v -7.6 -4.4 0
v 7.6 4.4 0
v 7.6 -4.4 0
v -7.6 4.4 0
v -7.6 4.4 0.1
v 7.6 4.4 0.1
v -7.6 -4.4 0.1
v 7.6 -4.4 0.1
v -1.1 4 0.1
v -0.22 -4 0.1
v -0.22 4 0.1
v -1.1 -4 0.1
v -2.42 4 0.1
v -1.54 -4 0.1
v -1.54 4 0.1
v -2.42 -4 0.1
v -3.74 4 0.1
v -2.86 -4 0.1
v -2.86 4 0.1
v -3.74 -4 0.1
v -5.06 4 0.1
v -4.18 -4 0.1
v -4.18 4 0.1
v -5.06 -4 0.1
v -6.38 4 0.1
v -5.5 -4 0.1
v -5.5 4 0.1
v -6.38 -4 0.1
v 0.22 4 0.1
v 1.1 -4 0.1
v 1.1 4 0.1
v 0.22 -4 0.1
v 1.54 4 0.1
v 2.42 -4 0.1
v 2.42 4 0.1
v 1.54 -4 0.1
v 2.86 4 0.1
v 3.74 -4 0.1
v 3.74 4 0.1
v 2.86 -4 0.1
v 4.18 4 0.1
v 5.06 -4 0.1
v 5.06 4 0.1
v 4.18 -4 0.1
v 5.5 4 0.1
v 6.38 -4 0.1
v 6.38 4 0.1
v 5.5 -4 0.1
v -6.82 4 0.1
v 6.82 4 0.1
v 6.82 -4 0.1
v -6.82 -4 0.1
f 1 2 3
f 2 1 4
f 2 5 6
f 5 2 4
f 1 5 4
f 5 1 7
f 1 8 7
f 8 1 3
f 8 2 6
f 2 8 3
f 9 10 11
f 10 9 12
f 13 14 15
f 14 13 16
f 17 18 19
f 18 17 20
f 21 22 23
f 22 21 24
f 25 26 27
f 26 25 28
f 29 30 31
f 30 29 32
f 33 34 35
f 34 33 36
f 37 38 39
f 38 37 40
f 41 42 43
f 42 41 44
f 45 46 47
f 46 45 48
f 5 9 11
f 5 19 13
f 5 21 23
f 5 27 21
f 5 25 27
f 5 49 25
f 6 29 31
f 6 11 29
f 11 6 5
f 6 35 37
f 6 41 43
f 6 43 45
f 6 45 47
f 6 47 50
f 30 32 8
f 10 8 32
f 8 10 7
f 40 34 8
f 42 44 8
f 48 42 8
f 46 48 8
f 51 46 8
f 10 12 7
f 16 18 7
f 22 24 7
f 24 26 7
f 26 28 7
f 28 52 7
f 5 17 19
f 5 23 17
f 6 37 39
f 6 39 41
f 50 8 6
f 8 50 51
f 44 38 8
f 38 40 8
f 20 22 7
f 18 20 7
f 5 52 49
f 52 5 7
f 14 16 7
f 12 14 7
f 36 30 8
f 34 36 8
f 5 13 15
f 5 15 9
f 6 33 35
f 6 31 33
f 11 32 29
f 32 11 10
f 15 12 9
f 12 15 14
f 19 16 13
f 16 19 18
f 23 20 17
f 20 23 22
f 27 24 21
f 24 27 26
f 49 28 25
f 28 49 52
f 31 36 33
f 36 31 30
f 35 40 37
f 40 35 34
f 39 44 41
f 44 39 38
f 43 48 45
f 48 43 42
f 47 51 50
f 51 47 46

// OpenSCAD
// file: ../p/4-4edge.scad
use <../lib.scad>
$fa=1; $fs=0.2;
function ldraw_lib__4_4edge(realsolid=false) = [
// 0 Circle 1.0
// 0 Name: 4-4edge.dat
// 0 Author: James Jessiman
// 0 !LDRAW_ORG Primitive UPDATE 2017-01
// 0 !LICENSE Licensed under CC BY 2.0 and CC BY 4.0 : see CAreadme.txt
// 
// 0 BFC CERTIFY CCW
  [0,"BFC","CERTIFY"],
  [0,"BFC","CCW"],
// 
// 0 !HISTORY 1998-12-15 [PTadmin] Official Update 1998-10
// 0 !HISTORY 2005-12-28 [PTadmin] Official Update 2005-01
// 0 !HISTORY 2007-06-24 [PTadmin] Header formatted for Contributor Agreement
// 0 !HISTORY 2008-07-01 [PTadmin] Official Update 2008-01
// 0 !HISTORY 2017-01-15 [Steffen] BFCed
// 0 !HISTORY 2017-12-30 [PTadmin] Official Update 2017-01
// 
// 
// 2 24 1 0 0 0.9239 0 0.3827
  [2,24,1,0,0,0.9239,0,0.3827],
// 2 24 0.9239 0 0.3827 0.7071 0 0.7071
  [2,24,0.9239,0,0.3827,0.7071,0,0.7071],
// 2 24 0.7071 0 0.7071 0.3827 0 0.9239
  [2,24,0.7071,0,0.7071,0.3827,0,0.9239],
// 2 24 0.3827 0 0.9239 0 0 1
  [2,24,0.3827,0,0.9239,0,0,1],
// 2 24 0 0 1 -0.3827 0 0.9239
  [2,24,0,0,1,-0.3827,0,0.9239],
// 2 24 -0.3827 0 0.9239 -0.7071 0 0.7071
  [2,24,-0.3827,0,0.9239,-0.7071,0,0.7071],
// 2 24 -0.7071 0 0.7071 -0.9239 0 0.3827
  [2,24,-0.7071,0,0.7071,-0.9239,0,0.3827],
// 2 24 -0.9239 0 0.3827 -1 0 -0
  [2,24,-0.9239,0,0.3827,-1,0,-0],
// 2 24 -1 0 -0 -0.9239 0 -0.3827
  [2,24,-1,0,-0,-0.9239,0,-0.3827],
// 2 24 -0.9239 0 -0.3827 -0.7071 0 -0.7071
  [2,24,-0.9239,0,-0.3827,-0.7071,0,-0.7071],
// 2 24 -0.7071 0 -0.7071 -0.3827 0 -0.9239
  [2,24,-0.7071,0,-0.7071,-0.3827,0,-0.9239],
// 2 24 -0.3827 0 -0.9239 0 0 -1
  [2,24,-0.3827,0,-0.9239,0,0,-1],
// 2 24 0 0 -1 0.3827 0 -0.9239
  [2,24,0,0,-1,0.3827,0,-0.9239],
// 2 24 0.3827 0 -0.9239 0.7071 0 -0.7071
  [2,24,0.3827,0,-0.9239,0.7071,0,-0.7071],
// 2 24 0.7071 0 -0.7071 0.9239 0 -0.3827
  [2,24,0.7071,0,-0.7071,0.9239,0,-0.3827],
// 2 24 0.9239 0 -0.3827 1 0 0
  [2,24,0.9239,0,-0.3827,1,0,0],
];
module ldraw_lib__4_4edge(step=0, col=false, unit=2/5, alt=false, line=0.2, solid=!$preview)
    makepoly(ldraw_lib__4_4edge(solid), step=step, col=col, unit=unit, alt=alt, line=line, solid=solid);
ldraw_lib__4_4edge(line=0.2);
// file: ../p/4-4disc.scad
use <../lib.scad>
$fa=1; $fs=0.2;
function ldraw_lib__4_4disc(realsolid=false) = [
// 0 Disc 1.0
// 0 Name: 4-4disc.dat
// 0 Author: James Jessiman
// 0 !LDRAW_ORG Primitive UPDATE 2002-02
// 0 !LICENSE Licensed under CC BY 2.0 and CC BY 4.0 : see CAreadme.txt
// 
// 0 BFC CERTIFY CCW
  [0,"BFC","CERTIFY"],
  [0,"BFC","CCW"],
// 
// 0 !HISTORY 1998-12-15 [PTadmin] Official Update 1998-10
// 0 !HISTORY 2002-03-23 [sbliss] Added BFC statement
// 0 !HISTORY 2002-04-25 [PTadmin] Official Update 2002-02
// 0 !HISTORY 2007-06-24 [PTadmin] Header formatted for Contributor Agreement
// 0 !HISTORY 2008-07-01 [PTadmin] Official Update 2008-01
// 
// 
// 3 16 0 0 0 1 0 0 0.9239 0 0.3827
  [3,16,0,0,0,1,0,0,0.9239,0,0.3827],
// 3 16 0 0 0 0.9239 0 0.3827 0.7071 0 0.7071
  [3,16,0,0,0,0.9239,0,0.3827,0.7071,0,0.7071],
// 3 16 0 0 0 0.7071 0 0.7071 0.3827 0 0.9239
  [3,16,0,0,0,0.7071,0,0.7071,0.3827,0,0.9239],
// 3 16 0 0 0 0.3827 0 0.9239 0 0 1
  [3,16,0,0,0,0.3827,0,0.9239,0,0,1],
// 3 16 0 0 0 0 0 1 -0.3827 0 0.9239
  [3,16,0,0,0,0,0,1,-0.3827,0,0.9239],
// 3 16 0 0 0 -0.3827 0 0.9239 -0.7071 0 0.7071
  [3,16,0,0,0,-0.3827,0,0.9239,-0.7071,0,0.7071],
// 3 16 0 0 0 -0.7071 0 0.7071 -0.9239 0 0.3827
  [3,16,0,0,0,-0.7071,0,0.7071,-0.9239,0,0.3827],
// 3 16 0 0 0 -0.9239 0 0.3827 -1 0 -0
  [3,16,0,0,0,-0.9239,0,0.3827,-1,0,-0],
// 3 16 0 0 0 -1 0 -0 -0.9239 0 -0.3827
  [3,16,0,0,0,-1,0,-0,-0.9239,0,-0.3827],
// 3 16 0 0 0 -0.9239 0 -0.3827 -0.7071 0 -0.7071
  [3,16,0,0,0,-0.9239,0,-0.3827,-0.7071,0,-0.7071],
// 3 16 0 0 0 -0.7071 0 -0.7071 -0.3827 0 -0.9239
  [3,16,0,0,0,-0.7071,0,-0.7071,-0.3827,0,-0.9239],
// 3 16 0 0 0 -0.3827 0 -0.9239 0 0 -1
  [3,16,0,0,0,-0.3827,0,-0.9239,0,0,-1],
// 3 16 0 0 0 0 0 -1 0.3827 0 -0.9239
  [3,16,0,0,0,0,0,-1,0.3827,0,-0.9239],
// 3 16 0 0 0 0.3827 0 -0.9239 0.7071 0 -0.7071
  [3,16,0,0,0,0.3827,0,-0.9239,0.7071,0,-0.7071],
// 3 16 0 0 0 0.7071 0 -0.7071 0.9239 0 -0.3827
  [3,16,0,0,0,0.7071,0,-0.7071,0.9239,0,-0.3827],
// 3 16 0 0 0 0.9239 0 -0.3827 1 0 0
  [3,16,0,0,0,0.9239,0,-0.3827,1,0,0],
// 0
];
module ldraw_lib__4_4disc(step=0, col=false, unit=2/5, alt=false, line=0.2, solid=!$preview)
    makepoly(ldraw_lib__4_4disc(solid), step=step, col=col, unit=unit, alt=alt, line=line, solid=solid);
ldraw_lib__4_4disc(line=0.2);
// file: ../p/4-4cyli.scad
use <../lib.scad>
$fa=1; $fs=0.2;
function ldraw_lib__4_4cyli(realsolid=false) = [
// 0 Cylinder 1.0
// 0 Name: 4-4cyli.dat
// 0 Author: James Jessiman
// 0 !LDRAW_ORG Primitive UPDATE 2005-01
// 0 !LICENSE Licensed under CC BY 2.0 and CC BY 4.0 : see CAreadme.txt
// 
// 0 BFC CERTIFY CCW
  [0,"BFC","CERTIFY"],
  [0,"BFC","CCW"],
// 
// 0 !HISTORY 1998-12-15 [PTadmin] Official Update 1998-10
// 0 !HISTORY 2002-03-23 [sbliss] Added BFC statement; merged headers from files in distributions LDraw 0.27 and Complete.
// 0 !HISTORY 2002-04-25 [PTadmin] Official Update 2002-02
// 0 !HISTORY 2004-12-14 [guyvivan] BFC CCW
// 0 !HISTORY 2005-12-28 [PTadmin] Official Update 2005-01
// 0 !HISTORY 2007-06-24 [PTadmin] Header formatted for Contributor Agreement
// 0 !HISTORY 2008-07-01 [PTadmin] Official Update 2008-01
// 
// 
// 4 16 1 1 0 0.9239 1 0.3827 0.9239 0 0.3827 1 0 0
  [4,16,1,1,0,0.9239,1,0.3827,0.9239,0,0.3827,1,0,0],
// 5 24 1 0 0 1 1 0 0.9239 0 0.3827 0.9239 0 -0.3827
  [5,24,1,0,0,1,1,0,0.9239,0,0.3827,0.9239,0,-0.3827],
// 4 16 0.9239 1 0.3827 0.7071 1 0.7071 0.7071 0 0.7071 0.9239 0 0.3827
  [4,16,0.9239,1,0.3827,0.7071,1,0.7071,0.7071,0,0.7071,0.9239,0,0.3827],
// 5 24 0.9239 0 0.3827 0.9239 1 0.3827 0.7071 0 0.7071 1 0 0
  [5,24,0.9239,0,0.3827,0.9239,1,0.3827,0.7071,0,0.7071,1,0,0],
// 4 16 0.7071 1 0.7071 0.3827 1 0.9239 0.3827 0 0.9239 0.7071 0 0.7071
  [4,16,0.7071,1,0.7071,0.3827,1,0.9239,0.3827,0,0.9239,0.7071,0,0.7071],
// 5 24 0.7071 0 0.7071 0.7071 1 0.7071 0.3827 0 0.9239 0.9239 0 0.3827
  [5,24,0.7071,0,0.7071,0.7071,1,0.7071,0.3827,0,0.9239,0.9239,0,0.3827],
// 4 16 0.3827 1 0.9239 0 1 1 0 0 1 0.3827 0 0.9239
  [4,16,0.3827,1,0.9239,0,1,1,0,0,1,0.3827,0,0.9239],
// 5 24 0.3827 0 0.9239 0.3827 1 0.9239 0 0 1 0.7071 0 0.7071
  [5,24,0.3827,0,0.9239,0.3827,1,0.9239,0,0,1,0.7071,0,0.7071],
// 4 16 0 1 1 -0.3827 1 0.9239 -0.3827 0 0.9239 0 0 1
  [4,16,0,1,1,-0.3827,1,0.9239,-0.3827,0,0.9239,0,0,1],
// 5 24 0 0 1 0 1 1 -0.3827 0 0.9239 0.3827 0 0.9239
  [5,24,0,0,1,0,1,1,-0.3827,0,0.9239,0.3827,0,0.9239],
// 4 16 -0.3827 1 0.9239 -0.7071 1 0.7071 -0.7071 0 0.7071 -0.3827 0 0.9239
  [4,16,-0.3827,1,0.9239,-0.7071,1,0.7071,-0.7071,0,0.7071,-0.3827,0,0.9239],
// 5 24 -0.3827 0 0.9239 -0.3827 1 0.9239 -0.7071 0 0.7071 0 0 1
  [5,24,-0.3827,0,0.9239,-0.3827,1,0.9239,-0.7071,0,0.7071,0,0,1],
// 4 16 -0.7071 1 0.7071 -0.9239 1 0.3827 -0.9239 0 0.3827 -0.7071 0 0.7071
  [4,16,-0.7071,1,0.7071,-0.9239,1,0.3827,-0.9239,0,0.3827,-0.7071,0,0.7071],
// 5 24 -0.7071 0 0.7071 -0.7071 1 0.7071 -0.9239 0 0.3827 -0.3827 0 0.9239
  [5,24,-0.7071,0,0.7071,-0.7071,1,0.7071,-0.9239,0,0.3827,-0.3827,0,0.9239],
// 4 16 -0.9239 1 0.3827 -1 1 0 -1 0 0 -0.9239 0 0.3827
  [4,16,-0.9239,1,0.3827,-1,1,0,-1,0,0,-0.9239,0,0.3827],
// 5 24 -0.9239 0 0.3827 -0.9239 1 0.3827 -1 0 0 -0.7071 0 0.7071
  [5,24,-0.9239,0,0.3827,-0.9239,1,0.3827,-1,0,0,-0.7071,0,0.7071],
// 4 16 -1 1 0 -0.9239 1 -0.3827 -0.9239 0 -0.3827 -1 0 0
  [4,16,-1,1,0,-0.9239,1,-0.3827,-0.9239,0,-0.3827,-1,0,0],
// 5 24 -1 0 0 -1 1 0 -0.9239 0 -0.3827 -0.9239 0 0.3827
  [5,24,-1,0,0,-1,1,0,-0.9239,0,-0.3827,-0.9239,0,0.3827],
// 4 16 -0.9239 1 -0.3827 -0.7071 1 -0.7071 -0.7071 0 -0.7071 -0.9239 0 -0.3827
  [4,16,-0.9239,1,-0.3827,-0.7071,1,-0.7071,-0.7071,0,-0.7071,-0.9239,0,-0.3827],
// 5 24 -0.9239 0 -0.3827 -0.9239 1 -0.3827 -0.7071 0 -0.7071 -1 0 0
  [5,24,-0.9239,0,-0.3827,-0.9239,1,-0.3827,-0.7071,0,-0.7071,-1,0,0],
// 4 16 -0.7071 1 -0.7071 -0.3827 1 -0.9239 -0.3827 0 -0.9239 -0.7071 0 -0.7071
  [4,16,-0.7071,1,-0.7071,-0.3827,1,-0.9239,-0.3827,0,-0.9239,-0.7071,0,-0.7071],
// 5 24 -0.7071 0 -0.7071 -0.7071 1 -0.7071 -0.3827 0 -0.9239 -0.9239 0 -0.3827
  [5,24,-0.7071,0,-0.7071,-0.7071,1,-0.7071,-0.3827,0,-0.9239,-0.9239,0,-0.3827],
// 4 16 -0.3827 1 -0.9239 0 1 -1 0 0 -1 -0.3827 0 -0.9239
  [4,16,-0.3827,1,-0.9239,0,1,-1,0,0,-1,-0.3827,0,-0.9239],
// 5 24 -0.3827 0 -0.9239 -0.3827 1 -0.9239 0 0 -1 -0.7071 0 -0.7071
  [5,24,-0.3827,0,-0.9239,-0.3827,1,-0.9239,0,0,-1,-0.7071,0,-0.7071],
// 4 16 0 1 -1 0.3827 1 -0.9239 0.3827 0 -0.9239 0 0 -1
  [4,16,0,1,-1,0.3827,1,-0.9239,0.3827,0,-0.9239,0,0,-1],
// 5 24 0 0 -1 0 1 -1 0.3827 0 -0.9239 -0.3827 0 -0.9239
  [5,24,0,0,-1,0,1,-1,0.3827,0,-0.9239,-0.3827,0,-0.9239],
// 4 16 0.3827 1 -0.9239 0.7071 1 -0.7071 0.7071 0 -0.7071 0.3827 0 -0.9239
  [4,16,0.3827,1,-0.9239,0.7071,1,-0.7071,0.7071,0,-0.7071,0.3827,0,-0.9239],
// 5 24 0.3827 0 -0.9239 0.3827 1 -0.9239 0.7071 0 -0.7071 0 0 -1
  [5,24,0.3827,0,-0.9239,0.3827,1,-0.9239,0.7071,0,-0.7071,0,0,-1],
// 4 16 0.7071 1 -0.7071 0.9239 1 -0.3827 0.9239 0 -0.3827 0.7071 0 -0.7071
  [4,16,0.7071,1,-0.7071,0.9239,1,-0.3827,0.9239,0,-0.3827,0.7071,0,-0.7071],
// 5 24 0.7071 0 -0.7071 0.7071 1 -0.7071 0.9239 0 -0.3827 0.3827 0 -0.9239
  [5,24,0.7071,0,-0.7071,0.7071,1,-0.7071,0.9239,0,-0.3827,0.3827,0,-0.9239],
// 4 16 0.9239 1 -0.3827 1 1 0 1 0 0 0.9239 0 -0.3827
  [4,16,0.9239,1,-0.3827,1,1,0,1,0,0,0.9239,0,-0.3827],
// 5 24 0.9239 0 -0.3827 0.9239 1 -0.3827 1 0 0 0.7071 0 -0.7071
  [5,24,0.9239,0,-0.3827,0.9239,1,-0.3827,1,0,0,0.7071,0,-0.7071],
// 0
];
module ldraw_lib__4_4cyli(step=0, col=false, unit=2/5, alt=false, line=0.2, solid=!$preview)
    makepoly(ldraw_lib__4_4cyli(solid), step=step, col=col, unit=unit, alt=alt, line=line, solid=solid);
ldraw_lib__4_4cyli(line=0.2);
// file: ../p/stud3.scad
use <../lib.scad>
use <4-4cyli.scad>
use <4-4disc.scad>
use <4-4edge.scad>
$fa=1; $fs=0.2;
function ldraw_lib__stud3(realsolid=false) = realsolid ? 
    [openscad(translate([0,0,-eps()], o=cylinder(4+eps(), r=4)),2)] : [
// 0 Stud Tube Solid
// 0 Name: stud3.dat
// 0 Author: James Jessiman
// 0 !LDRAW_ORG Primitive UPDATE 2012-01
// 0 !LICENSE Licensed under CC BY 2.0 and CC BY 4.0 : see CAreadme.txt
// 
// 0 BFC CERTIFY CCW
  [0,"BFC","CERTIFY"],
  [0,"BFC","CCW"],
// 
// 0 !HISTORY 2002-04-04 [sbliss] Modified for BFC compliance
// 0 !HISTORY 2002-04-25 [PTadmin] Official Update 2002-02
// 0 !HISTORY 2007-06-24 [PTadmin] Header formatted for Contributor Agreement
// 0 !HISTORY 2008-07-01 [PTadmin] Official Update 2008-01
// 0 !HISTORY 2012-02-16 [Philo] Changed to CCW
// 0 !HISTORY 2012-03-30 [PTadmin] Official Update 2012-01
// 
// 
// 1 16 0 -4 0 4 0 0 0 1 0 0 0 4 4-4edge.dat
  [1,16,0,-4,0,4,0,0,0,1,0,0,0,4, ldraw_lib__4_4edge(realsolid)],
// 1 16 0 0 0 4 0 0 0 1 0 0 0 4 4-4edge.dat
  [1,16,0,0,0,4,0,0,0,1,0,0,0,4, ldraw_lib__4_4edge(realsolid)],
// 1 16 0 -4 0 4 0 0 0 1 0 0 0 4 4-4disc.dat
  [1,16,0,-4,0,4,0,0,0,1,0,0,0,4, ldraw_lib__4_4disc(realsolid)],
// 1 16 0 -4 0 4 0 0 0 4 0 0 0 4 4-4cyli.dat
  [1,16,0,-4,0,4,0,0,0,4,0,0,0,4, ldraw_lib__4_4cyli(realsolid)],
];
module ldraw_lib__stud3(step=0, col=false, unit=2/5, alt=false, line=0.2, solid=!$preview)
    makepoly(ldraw_lib__stud3(solid), step=step, col=col, unit=unit, alt=alt, line=line, solid=solid);
ldraw_lib__stud3(line=0.2);
// file: ../p/stud.scad
use <../lib.scad>
use <4-4cyli.scad>
use <4-4disc.scad>
use <4-4edge.scad>
$fa=1; $fs=0.2;
function ldraw_lib__stud(realsolid=false) = realsolid ? 
    [openscad(translate([0,0,-eps()], o=cylinder(4+eps(), r=6)),2)] : [
// 0 Stud
// 0 Name: stud.dat
// 0 Author: James Jessiman
// 0 !LDRAW_ORG Primitive UPDATE 2012-01
// 0 !LICENSE Licensed under CC BY 2.0 and CC BY 4.0 : see CAreadme.txt
// 
// 0 BFC CERTIFY CCW
  [0,"BFC","CERTIFY"],
  [0,"BFC","CCW"],
// 
// 0 !HISTORY 2002-04-04 [sbliss] Modified for BFC compliance
// 0 !HISTORY 2002-04-25 [PTadmin] Official Update 2002-02
// 0 !HISTORY 2007-06-24 [PTadmin] Header formatted for Contributor Agreement
// 0 !HISTORY 2008-07-01 [PTadmin] Official Update 2008-01
// 0 !HISTORY 2012-02-16 [Philo] Changed to CCW
// 0 !HISTORY 2012-03-30 [PTadmin] Official Update 2012-01
// 
// 
// 1 16 0 0 0 6 0 0 0 1 0 0 0 6 4-4edge.dat
  [1,16,0,0,0,6,0,0,0,1,0,0,0,6, ldraw_lib__4_4edge(realsolid)],
// 1 16 0 -4 0 6 0 0 0 1 0 0 0 6 4-4edge.dat
  [1,16,0,-4,0,6,0,0,0,1,0,0,0,6, ldraw_lib__4_4edge(realsolid)],
// 1 16 0 0 0 6 0 0 0 -4 0 0 0 6 4-4cyli.dat
  [1,16,0,0,0,6,0,0,0,-4,0,0,0,6, ldraw_lib__4_4cyli(realsolid)],
// 1 16 0 -4 0 6 0 0 0 1 0 0 0 6 4-4disc.dat
  [1,16,0,-4,0,6,0,0,0,1,0,0,0,6, ldraw_lib__4_4disc(realsolid)],
];
module ldraw_lib__stud(step=0, col=false, unit=2/5, alt=false, line=0.2, solid=!$preview)
    makepoly(ldraw_lib__stud(solid), step=step, col=col, unit=unit, alt=alt, line=line, solid=solid);
ldraw_lib__stud(line=0.2);
// file: ../p/box5.scad
use <../lib.scad>
$fa=1; $fs=0.2;
function ldraw_lib__box5(realsolid=false) = [
// 0 Box with 5 Faces and All Edges
// 0 Name: box5.dat
// 0 Author: James Jessiman
// 0 !LDRAW_ORG Primitive UPDATE 2012-01
// 0 !LICENSE Licensed under CC BY 2.0 and CC BY 4.0 : see CAreadme.txt
// 
// 0 BFC CERTIFY CCW
  [0,"BFC","CERTIFY"],
  [0,"BFC","CCW"],
// 
// 0 !HISTORY 2002-04-03 [sbliss] Modified for BFC compliance
// 0 !HISTORY 2002-04-25 [PTadmin] Official Update 2002-02
// 0 !HISTORY 2007-06-24 [PTadmin] Header formatted for Contributor Agreement
// 0 !HISTORY 2008-07-01 [PTadmin] Official Update 2008-01
// 0 !HISTORY 2012-02-16 [Philo] Changed to CCW
// 0 !HISTORY 2012-03-30 [PTadmin] Official Update 2012-01
// 
// 
// 2 24 1 1 1 -1 1 1
  [2,24,1,1,1,-1,1,1],
// 2 24 -1 1 1 -1 1 -1
  [2,24,-1,1,1,-1,1,-1],
// 2 24 -1 1 -1 1 1 -1
  [2,24,-1,1,-1,1,1,-1],
// 2 24 1 1 -1 1 1 1
  [2,24,1,1,-1,1,1,1],
// 2 24 1 0 1 -1 0 1
  [2,24,1,0,1,-1,0,1],
// 2 24 -1 0 1 -1 0 -1
  [2,24,-1,0,1,-1,0,-1],
// 2 24 -1 0 -1 1 0 -1
  [2,24,-1,0,-1,1,0,-1],
// 2 24 1 0 -1 1 0 1
  [2,24,1,0,-1,1,0,1],
// 2 24 1 0 1 1 1 1
  [2,24,1,0,1,1,1,1],
// 2 24 -1 0 1 -1 1 1
  [2,24,-1,0,1,-1,1,1],
// 2 24 1 0 -1 1 1 -1
  [2,24,1,0,-1,1,1,-1],
// 2 24 -1 0 -1 -1 1 -1
  [2,24,-1,0,-1,-1,1,-1],
// 4 16 -1 1 1 1 1 1 1 1 -1 -1 1 -1
  [4,16,-1,1,1,1,1,1,1,1,-1,-1,1,-1],
// 4 16 -1 1 1 -1 0 1 1 0 1 1 1 1
  [4,16,-1,1,1,-1,0,1,1,0,1,1,1,1],
// 4 16 -1 1 -1 -1 0 -1 -1 0 1 -1 1 1
  [4,16,-1,1,-1,-1,0,-1,-1,0,1,-1,1,1],
// 4 16 1 1 -1 1 0 -1 -1 0 -1 -1 1 -1
  [4,16,1,1,-1,1,0,-1,-1,0,-1,-1,1,-1],
// 4 16 1 1 1 1 0 1 1 0 -1 1 1 -1
  [4,16,1,1,1,1,0,1,1,0,-1,1,1,-1],
];
module ldraw_lib__box5(step=0, col=false, unit=2/5, alt=false, line=0.2, solid=!$preview)
    makepoly(ldraw_lib__box5(solid), step=step, col=col, unit=unit, alt=alt, line=line, solid=solid);
ldraw_lib__box5(line=0.2);
// file: ../p/box4t.scad
use <../lib.scad>
$fa=1; $fs=0.2;
function ldraw_lib__box4t(realsolid=false) = [
// 0 Box with 4 Adjacent Faces and All Edges
// 0 Name: box4t.dat
// 0 Author: Tore Eriksson [Tore_Eriksson]
// 0 !LDRAW_ORG Primitive UPDATE 2003-02
// 0 !LICENSE Licensed under CC BY 2.0 and CC BY 4.0 : see CAreadme.txt
// 
// 0 BFC CERTIFY CCW
  [0,"BFC","CERTIFY"],
  [0,"BFC","CCW"],
// 
// 0 !HISTORY 1997-09-29 [PTadmin] Official Update 1997-15
// 0 !HISTORY 2002-08-31 [izanette] Modified with WINDZ for BFC compliance
// 0 !HISTORY 2003-08-01 [PTadmin] Official Update 2003-02
// 0 !HISTORY 2007-06-24 [PTadmin] Header formatted for Contributor Agreement
// 0 !HISTORY 2008-07-01 [PTadmin] Official Update 2008-01
// 
// 
// 2 24 1 1 1 -1 1 1
  [2,24,1,1,1,-1,1,1],
// 2 24 -1 1 1 -1 1 -1
  [2,24,-1,1,1,-1,1,-1],
// 2 24 -1 1 -1 1 1 -1
  [2,24,-1,1,-1,1,1,-1],
// 2 24 1 1 -1 1 1 1
  [2,24,1,1,-1,1,1,1],
// 2 24 1 0 1 -1 0 1
  [2,24,1,0,1,-1,0,1],
// 2 24 -1 0 1 -1 0 -1
  [2,24,-1,0,1,-1,0,-1],
// 2 24 -1 0 -1 1 0 -1
  [2,24,-1,0,-1,1,0,-1],
// 2 24 1 0 -1 1 0 1
  [2,24,1,0,-1,1,0,1],
// 2 24 1 0 1 1 1 1
  [2,24,1,0,1,1,1,1],
// 2 24 -1 0 1 -1 1 1
  [2,24,-1,0,1,-1,1,1],
// 2 24 1 0 -1 1 1 -1
  [2,24,1,0,-1,1,1,-1],
// 2 24 -1 0 -1 -1 1 -1
  [2,24,-1,0,-1,-1,1,-1],
// 4 16 1 1 1 1 1 -1 -1 1 -1 -1 1 1
  [4,16,1,1,1,1,1,-1,-1,1,-1,-1,1,1],
// 4 16 1 1 1 -1 1 1 -1 0 1 1 0 1
  [4,16,1,1,1,-1,1,1,-1,0,1,1,0,1],
// 4 16 -1 1 1 -1 1 -1 -1 0 -1 -1 0 1
  [4,16,-1,1,1,-1,1,-1,-1,0,-1,-1,0,1],
// 0 4 16 -1 1 -1 -1 0 -1 1 0 -1 1 1 -1
// 4 16 1 1 -1 1 1 1 1 0 1 1 0 -1
  [4,16,1,1,-1,1,1,1,1,0,1,1,0,-1],
// 0
];
module ldraw_lib__box4t(step=0, col=false, unit=2/5, alt=false, line=0.2, solid=!$preview)
    makepoly(ldraw_lib__box4t(solid), step=step, col=col, unit=unit, alt=alt, line=line, solid=solid);
ldraw_lib__box4t(line=0.2);
// file: s/3004s01.scad
use <../../lib.scad>
use <../../p/box4t.scad>
use <../../p/box5.scad>
use <../../p/stud.scad>
use <../../p/stud3.scad>
$fa=1; $fs=0.2;
function ldraw_lib__s__3004s01(realsolid=false) = [
// 0 ~Brick  1 x  2 without Front Face
// 0 Name: s\3004s01.dat
// 0 Author: James Jessiman
// 0 !LDRAW_ORG Subpart UPDATE 2003-03
// 0 !LICENSE Licensed under CC BY 2.0 and CC BY 4.0 : see CAreadme.txt
// 
// 0 BFC CERTIFY CCW
  [0,"BFC","CERTIFY"],
  [0,"BFC","CCW"],
// 
// 0 !HISTORY 2003-09-07 [jriley] Subfiling, BFC
// 0 !HISTORY 2003-12-19 [PTadmin] Official Update 2003-03
// 0 !HISTORY 2007-08-29 [PTadmin] Header formatted for Contributor Agreement
// 0 !HISTORY 2008-07-01 [PTadmin] Official Update 2008-01
// 
// 
// 1 16 0 4 0 1 0 0 0 -5 0 0 0 1 stud3.dat
  [1,16,0,4,0,1,0,0,0,-5,0,0,0,1, ldraw_lib__stud3(realsolid)],
// 0 BFC INVERTNEXT
  [0,"BFC","INVERTNEXT"],
// 1 16 0 24 0 16 0 0 0 -20 0 0 0 6 box5.dat
  [1,16,0,24,0,16,0,0,0,-20,0,0,0,6, ldraw_lib__box5(realsolid)],
// 4 16 20 24 10 16 24 6 -16 24 6 -20 24 10
  [4,16,20,24,10,16,24,6,-16,24,6,-20,24,10],
// 4 16 -20 24 10 -16 24 6 -16 24 -6 -20 24 -10
  [4,16,-20,24,10,-16,24,6,-16,24,-6,-20,24,-10],
// 4 16 -20 24 -10 -16 24 -6 16 24 -6 20 24 -10
  [4,16,-20,24,-10,-16,24,-6,16,24,-6,20,24,-10],
// 4 16 20 24 -10 16 24 -6 16 24 6 20 24 10
  [4,16,20,24,-10,16,24,-6,16,24,6,20,24,10],
// 1 16 0 24 0 20 0 0 0 -24 0 0 0 10 box4t.dat
  [1,16,0,24,0,20,0,0,0,-24,0,0,0,10, ldraw_lib__box4t(realsolid)],
// 1 16 10 0 0 1 0 0 0 1 0 0 0 1 stud.dat
  [1,16,10,0,0,1,0,0,0,1,0,0,0,1, ldraw_lib__stud(realsolid)],
// 1 16 -10 0 0 1 0 0 0 1 0 0 0 1 stud.dat
  [1,16,-10,0,0,1,0,0,0,1,0,0,0,1, ldraw_lib__stud(realsolid)],
// 0
];
module ldraw_lib__s__3004s01(step=0, col=false, unit=2/5, alt=false, line=0.2, solid=!$preview)
    makepoly(ldraw_lib__s__3004s01(solid), step=step, col=col, unit=unit, alt=alt, line=line, solid=solid);
ldraw_lib__s__3004s01(line=0.2);
// file: 3004.scad
use <../lib.scad>
use <s/3004s01.scad>
$fa=1; $fs=0.2;
function ldraw_lib__3004(realsolid=false) = [
// 0 Brick  1 x  2
// 0 Name: 3004.dat
// 0 Author: James Jessiman
// 0 !LDRAW_ORG Part UPDATE 2022-05
// 0 !LICENSE Licensed under CC BY 2.0 and CC BY 4.0 : see CAreadme.txt
// 
// 0 BFC CERTIFY CCW
  [0,"BFC","CERTIFY"],
  [0,"BFC","CCW"],
// 
// 0 !HISTORY 2001-10-26 [PTadmin] Official Update 2001-01
// 0 !HISTORY 2002-05-07 {unknown} BFC Certification
// 0 !HISTORY 2002-06-11 [PTadmin] Official Update 2002-03
// 0 !HISTORY 2007-05-07 [PTadmin] Header formatted for Contributor Agreement
// 0 !HISTORY 2008-07-01 [PTadmin] Official Update 2008-01
// 0 !HISTORY 2022-08-04 [MagFors] Using subfile
// 0 !HISTORY 2022-09-15 [PTadmin] Official Update 2022-05
// 
// 
// 1 16 0 0 0 1 0 0 0 1 0 0 0 1 s\3004s01.dat
  [1,16,0,0,0,1,0,0,0,1,0,0,0,1, ldraw_lib__s__3004s01(realsolid)],
// 4 16 -20 24 -10 20 24 -10 20 0 -10 -20 0 -10
  [4,16,-20,24,-10,20,24,-10,20,0,-10,-20,0,-10],
];
module ldraw_lib__3004(step=0, col=false, unit=2/5, alt=false, line=0.2, solid=!$preview)
    makepoly(ldraw_lib__3004(solid), step=step, col=col, unit=unit, alt=alt, line=line, solid=solid);
ldraw_lib__3004(line=0.2);
// file: ../p/box5-12.scad
use <../lib.scad>
$fa=1; $fs=0.2;
function ldraw_lib__box5_12(realsolid=false) = [
// 0 Box with 5 Faces without Any Edges
// 0 Name: box5-12.dat
// 0 Author: Chris Dee [cwdee]
// 0 !LDRAW_ORG Primitive UPDATE 2009-02
// 0 !LICENSE Licensed under CC BY 2.0 and CC BY 4.0 : see CAreadme.txt
// 
// 0 BFC CERTIFY CCW
  [0,"BFC","CERTIFY"],
  [0,"BFC","CCW"],
// 
// 0 !HISTORY 2009-09-03 [PTadmin] Official Update 2009-02
// 
// 
// 4 16 1 1 1 1 1 -1 -1 1 -1 -1 1 1
  [4,16,1,1,1,1,1,-1,-1,1,-1,-1,1,1],
// 4 16 -1 0 1 1 0 1 1 1 1 -1 1 1
  [4,16,-1,0,1,1,0,1,1,1,1,-1,1,1],
// 4 16 -1 0 -1 -1 0 1 -1 1 1 -1 1 -1
  [4,16,-1,0,-1,-1,0,1,-1,1,1,-1,1,-1],
// 4 16 1 0 -1 -1 0 -1 -1 1 -1 1 1 -1
  [4,16,1,0,-1,-1,0,-1,-1,1,-1,1,1,-1],
// 4 16 1 0 1 1 0 -1 1 1 -1 1 1 1
  [4,16,1,0,1,1,0,-1,1,1,-1,1,1,1],
// 0
];
module ldraw_lib__box5_12(step=0, col=false, unit=2/5, alt=false, line=0.2, solid=!$preview)
    makepoly(ldraw_lib__box5_12(solid), step=step, col=col, unit=unit, alt=alt, line=line, solid=solid);
ldraw_lib__box5_12(line=0.2);
// main file
use <../lib.scad>
use <../p/box5-12.scad>
$fa=1; $fs=0.2;
function ldraw_lib__4100418c(realsolid=false) = [
// 0 Sticker  1.1 x  1.9 with 11 Black Stripes
// 0 Name: 4100418c.dat
// 0 Author: J.C. Tchang [tchang]
// 0 !LDRAW_ORG Part UPDATE 2013-01
// 0 !LICENSE Licensed under CC BY 2.0 and CC BY 4.0 : see CAreadme.txt
// 
// 0 BFC CERTIFY CCW
  [0,"BFC","CERTIFY"],
  [0,"BFC","CCW"],
// 
// 0 !KEYWORDS Set 5571
// 
// 0 !HISTORY 2013-07-21 [PTadmin] Official Update 2013-01
// 
// 
// 1 16 0 -0.25 0 19 0 0 0 0.25 0 0 0 11 box5-12.dat
  [1,16,0,-0.25,0,19,0,0,0,0.25,0,0,0,11, ldraw_lib__box5_12(realsolid)],
// 0 //
// 4 16 -0.55 -0.25 10 -2.75 -0.25 10 -2.75 -0.25 -10 -0.55 -0.25 -10
  [4,16,-0.55,-0.25,10,-2.75,-0.25,10,-2.75,-0.25,-10,-0.55,-0.25,-10],
// 4 16 -3.85 -0.25 10 -6.05 -0.25 10 -6.05 -0.25 -10 -3.85 -0.25 -10
  [4,16,-3.85,-0.25,10,-6.05,-0.25,10,-6.05,-0.25,-10,-3.85,-0.25,-10],
// 4 16 -7.15 -0.25 10 -9.35 -0.25 10 -9.35 -0.25 -10 -7.15 -0.25 -10
  [4,16,-7.15,-0.25,10,-9.35,-0.25,10,-9.35,-0.25,-10,-7.15,-0.25,-10],
// 4 16 -10.45 -0.25 10 -12.65 -0.25 10 -12.65 -0.25 -10 -10.45 -0.25 -10
  [4,16,-10.45,-0.25,10,-12.65,-0.25,10,-12.65,-0.25,-10,-10.45,-0.25,-10],
// 4 16 -13.75 -0.25 10 -15.95 -0.25 10 -15.95 -0.25 -10 -13.75 -0.25 -10
  [4,16,-13.75,-0.25,10,-15.95,-0.25,10,-15.95,-0.25,-10,-13.75,-0.25,-10],
// 4 16 0.55 -0.25 -10 2.75 -0.25 -10 2.75 -0.25 10 0.55 -0.25 10
  [4,16,0.55,-0.25,-10,2.75,-0.25,-10,2.75,-0.25,10,0.55,-0.25,10],
// 4 16 3.85 -0.25 -10 6.05 -0.25 -10 6.05 -0.25 10 3.85 -0.25 10
  [4,16,3.85,-0.25,-10,6.05,-0.25,-10,6.05,-0.25,10,3.85,-0.25,10],
// 4 16 7.15 -0.25 -10 9.35 -0.25 -10 9.35 -0.25 10 7.15 -0.25 10
  [4,16,7.15,-0.25,-10,9.35,-0.25,-10,9.35,-0.25,10,7.15,-0.25,10],
// 4 16 10.45 -0.25 -10 12.65 -0.25 -10 12.65 -0.25 10 10.45 -0.25 10
  [4,16,10.45,-0.25,-10,12.65,-0.25,-10,12.65,-0.25,10,10.45,-0.25,10],
// 4 16 13.75 -0.25 -10 15.95 -0.25 -10 15.95 -0.25 10 13.75 -0.25 10
  [4,16,13.75,-0.25,-10,15.95,-0.25,-10,15.95,-0.25,10,13.75,-0.25,10],
// 3 16 -19 -0.25 11 -2.75 -0.25 10 -0.55 -0.25 10
  [3,16,-19,-0.25,11,-2.75,-0.25,10,-0.55,-0.25,10],
// 3 16 -19 -0.25 11 -7.15 -0.25 10 -6.05 -0.25 10
  [3,16,-19,-0.25,11,-7.15,-0.25,10,-6.05,-0.25,10],
// 3 16 -19 -0.25 11 -12.65 -0.25 10 -10.45 -0.25 10
  [3,16,-19,-0.25,11,-12.65,-0.25,10,-10.45,-0.25,10],
// 3 16 -19 -0.25 11 -13.75 -0.25 10 -12.65 -0.25 10
  [3,16,-19,-0.25,11,-13.75,-0.25,10,-12.65,-0.25,10],
// 3 16 -19 -0.25 11 -15.95 -0.25 10 -13.75 -0.25 10
  [3,16,-19,-0.25,11,-15.95,-0.25,10,-13.75,-0.25,10],
// 3 16 -19 -0.25 11 -17.05 -0.25 10 -15.95 -0.25 10
  [3,16,-19,-0.25,11,-17.05,-0.25,10,-15.95,-0.25,10],
// 3 16 19 -0.25 11 0.55 -0.25 10 2.75 -0.25 10
  [3,16,19,-0.25,11,0.55,-0.25,10,2.75,-0.25,10],
// 4 16 0.55 -0.25 10 19 -0.25 11 -19 -0.25 11 -0.55 -0.25 10
  [4,16,0.55,-0.25,10,19,-0.25,11,-19,-0.25,11,-0.55,-0.25,10],
// 3 16 19 -0.25 11 6.05 -0.25 10 7.15 -0.25 10
  [3,16,19,-0.25,11,6.05,-0.25,10,7.15,-0.25,10],
// 3 16 19 -0.25 11 10.45 -0.25 10 12.65 -0.25 10
  [3,16,19,-0.25,11,10.45,-0.25,10,12.65,-0.25,10],
// 3 16 19 -0.25 11 12.65 -0.25 10 13.75 -0.25 10
  [3,16,19,-0.25,11,12.65,-0.25,10,13.75,-0.25,10],
// 3 16 19 -0.25 11 13.75 -0.25 10 15.95 -0.25 10
  [3,16,19,-0.25,11,13.75,-0.25,10,15.95,-0.25,10],
// 3 16 19 -0.25 11 15.95 -0.25 10 17.05 -0.25 10
  [3,16,19,-0.25,11,15.95,-0.25,10,17.05,-0.25,10],
// 3 16 2.75 -0.25 -10 0.55 -0.25 -10 19 -0.25 -11
  [3,16,2.75,-0.25,-10,0.55,-0.25,-10,19,-0.25,-11],
// 4 16 -19 -0.25 -11 19 -0.25 -11 0.55 -0.25 -10 -0.55 -0.25 -10
  [4,16,-19,-0.25,-11,19,-0.25,-11,0.55,-0.25,-10,-0.55,-0.25,-10],
// 3 16 7.15 -0.25 -10 6.05 -0.25 -10 19 -0.25 -11
  [3,16,7.15,-0.25,-10,6.05,-0.25,-10,19,-0.25,-11],
// 3 16 12.65 -0.25 -10 10.45 -0.25 -10 19 -0.25 -11
  [3,16,12.65,-0.25,-10,10.45,-0.25,-10,19,-0.25,-11],
// 3 16 13.75 -0.25 -10 12.65 -0.25 -10 19 -0.25 -11
  [3,16,13.75,-0.25,-10,12.65,-0.25,-10,19,-0.25,-11],
// 3 16 15.95 -0.25 -10 13.75 -0.25 -10 19 -0.25 -11
  [3,16,15.95,-0.25,-10,13.75,-0.25,-10,19,-0.25,-11],
// 3 16 17.05 -0.25 -10 15.95 -0.25 -10 19 -0.25 -11
  [3,16,17.05,-0.25,-10,15.95,-0.25,-10,19,-0.25,-11],
// 3 16 -0.55 -0.25 -10 -2.75 -0.25 -10 -19 -0.25 -11
  [3,16,-0.55,-0.25,-10,-2.75,-0.25,-10,-19,-0.25,-11],
// 3 16 -6.05 -0.25 -10 -7.15 -0.25 -10 -19 -0.25 -11
  [3,16,-6.05,-0.25,-10,-7.15,-0.25,-10,-19,-0.25,-11],
// 3 16 -10.45 -0.25 -10 -12.65 -0.25 -10 -19 -0.25 -11
  [3,16,-10.45,-0.25,-10,-12.65,-0.25,-10,-19,-0.25,-11],
// 3 16 -12.65 -0.25 -10 -13.75 -0.25 -10 -19 -0.25 -11
  [3,16,-12.65,-0.25,-10,-13.75,-0.25,-10,-19,-0.25,-11],
// 3 16 -13.75 -0.25 -10 -15.95 -0.25 -10 -19 -0.25 -11
  [3,16,-13.75,-0.25,-10,-15.95,-0.25,-10,-19,-0.25,-11],
// 3 16 -15.95 -0.25 -10 -17.05 -0.25 -10 -19 -0.25 -11
  [3,16,-15.95,-0.25,-10,-17.05,-0.25,-10,-19,-0.25,-11],
// 3 16 -19 -0.25 11 -9.35 -0.25 10 -7.15 -0.25 10
  [3,16,-19,-0.25,11,-9.35,-0.25,10,-7.15,-0.25,10],
// 3 16 -19 -0.25 11 -10.45 -0.25 10 -9.35 -0.25 10
  [3,16,-19,-0.25,11,-10.45,-0.25,10,-9.35,-0.25,10],
// 3 16 19 -0.25 11 7.15 -0.25 10 9.35 -0.25 10
  [3,16,19,-0.25,11,7.15,-0.25,10,9.35,-0.25,10],
// 3 16 19 -0.25 11 9.35 -0.25 10 10.45 -0.25 10
  [3,16,19,-0.25,11,9.35,-0.25,10,10.45,-0.25,10],
// 4 16 19 -0.25 -11 19 -0.25 11 17.05 -0.25 10 17.05 -0.25 -10
  [4,16,19,-0.25,-11,19,-0.25,11,17.05,-0.25,10,17.05,-0.25,-10],
// 3 16 10.45 -0.25 -10 9.35 -0.25 -10 19 -0.25 -11
  [3,16,10.45,-0.25,-10,9.35,-0.25,-10,19,-0.25,-11],
// 3 16 9.35 -0.25 -10 7.15 -0.25 -10 19 -0.25 -11
  [3,16,9.35,-0.25,-10,7.15,-0.25,-10,19,-0.25,-11],
// 3 16 -9.35 -0.25 -10 -10.45 -0.25 -10 -19 -0.25 -11
  [3,16,-9.35,-0.25,-10,-10.45,-0.25,-10,-19,-0.25,-11],
// 3 16 -7.15 -0.25 -10 -9.35 -0.25 -10 -19 -0.25 -11
  [3,16,-7.15,-0.25,-10,-9.35,-0.25,-10,-19,-0.25,-11],
// 4 16 -17.05 -0.25 10 -19 -0.25 11 -19 -0.25 -11 -17.05 -0.25 -10
  [4,16,-17.05,-0.25,10,-19,-0.25,11,-19,-0.25,-11,-17.05,-0.25,-10],
// 3 16 -3.85 -0.25 -10 -6.05 -0.25 -10 -19 -0.25 -11
  [3,16,-3.85,-0.25,-10,-6.05,-0.25,-10,-19,-0.25,-11],
// 3 16 -2.75 -0.25 -10 -3.85 -0.25 -10 -19 -0.25 -11
  [3,16,-2.75,-0.25,-10,-3.85,-0.25,-10,-19,-0.25,-11],
// 3 16 3.85 -0.25 -10 2.75 -0.25 -10 19 -0.25 -11
  [3,16,3.85,-0.25,-10,2.75,-0.25,-10,19,-0.25,-11],
// 3 16 6.05 -0.25 -10 3.85 -0.25 -10 19 -0.25 -11
  [3,16,6.05,-0.25,-10,3.85,-0.25,-10,19,-0.25,-11],
// 3 16 -19 -0.25 11 -6.05 -0.25 10 -3.85 -0.25 10
  [3,16,-19,-0.25,11,-6.05,-0.25,10,-3.85,-0.25,10],
// 3 16 -19 -0.25 11 -3.85 -0.25 10 -2.75 -0.25 10
  [3,16,-19,-0.25,11,-3.85,-0.25,10,-2.75,-0.25,10],
// 3 16 19 -0.25 11 3.85 -0.25 10 6.05 -0.25 10
  [3,16,19,-0.25,11,3.85,-0.25,10,6.05,-0.25,10],
// 3 16 19 -0.25 11 2.75 -0.25 10 3.85 -0.25 10
  [3,16,19,-0.25,11,2.75,-0.25,10,3.85,-0.25,10],
// 0 //
// 4 0 0.55 -0.25 10 -0.55 -0.25 10 -0.55 -0.25 -10 0.55 -0.25 -10
  [4,0,0.55,-0.25,10,-0.55,-0.25,10,-0.55,-0.25,-10,0.55,-0.25,-10],
// 4 0 -2.75 -0.25 10 -3.85 -0.25 10 -3.85 -0.25 -10 -2.75 -0.25 -10
  [4,0,-2.75,-0.25,10,-3.85,-0.25,10,-3.85,-0.25,-10,-2.75,-0.25,-10],
// 4 0 -6.05 -0.25 10 -7.15 -0.25 10 -7.15 -0.25 -10 -6.05 -0.25 -10
  [4,0,-6.05,-0.25,10,-7.15,-0.25,10,-7.15,-0.25,-10,-6.05,-0.25,-10],
// 4 0 -9.35 -0.25 10 -10.45 -0.25 10 -10.45 -0.25 -10 -9.35 -0.25 -10
  [4,0,-9.35,-0.25,10,-10.45,-0.25,10,-10.45,-0.25,-10,-9.35,-0.25,-10],
// 4 0 -12.65 -0.25 10 -13.75 -0.25 10 -13.75 -0.25 -10 -12.65 -0.25 -10
  [4,0,-12.65,-0.25,10,-13.75,-0.25,10,-13.75,-0.25,-10,-12.65,-0.25,-10],
// 4 0 -15.95 -0.25 10 -17.05 -0.25 10 -17.05 -0.25 -10 -15.95 -0.25 -10
  [4,0,-15.95,-0.25,10,-17.05,-0.25,10,-17.05,-0.25,-10,-15.95,-0.25,-10],
// 4 0 2.75 -0.25 -10 3.85 -0.25 -10 3.85 -0.25 10 2.75 -0.25 10
  [4,0,2.75,-0.25,-10,3.85,-0.25,-10,3.85,-0.25,10,2.75,-0.25,10],
// 4 0 6.05 -0.25 -10 7.15 -0.25 -10 7.15 -0.25 10 6.05 -0.25 10
  [4,0,6.05,-0.25,-10,7.15,-0.25,-10,7.15,-0.25,10,6.05,-0.25,10],
// 4 0 9.35 -0.25 -10 10.45 -0.25 -10 10.45 -0.25 10 9.35 -0.25 10
  [4,0,9.35,-0.25,-10,10.45,-0.25,-10,10.45,-0.25,10,9.35,-0.25,10],
// 4 0 12.65 -0.25 -10 13.75 -0.25 -10 13.75 -0.25 10 12.65 -0.25 10
  [4,0,12.65,-0.25,-10,13.75,-0.25,-10,13.75,-0.25,10,12.65,-0.25,10],
// 4 0 15.95 -0.25 -10 17.05 -0.25 -10 17.05 -0.25 10 15.95 -0.25 10
  [4,0,15.95,-0.25,-10,17.05,-0.25,-10,17.05,-0.25,10,15.95,-0.25,10],
];
module ldraw_lib__4100418c(step=0, col=false, unit=2/5, alt=false, line=0.2, solid=!$preview)
    makepoly(ldraw_lib__4100418c(solid), step=step, col=col, unit=unit, alt=alt, line=line, solid=solid);
ldraw_lib__4100418c(line=0.2);
